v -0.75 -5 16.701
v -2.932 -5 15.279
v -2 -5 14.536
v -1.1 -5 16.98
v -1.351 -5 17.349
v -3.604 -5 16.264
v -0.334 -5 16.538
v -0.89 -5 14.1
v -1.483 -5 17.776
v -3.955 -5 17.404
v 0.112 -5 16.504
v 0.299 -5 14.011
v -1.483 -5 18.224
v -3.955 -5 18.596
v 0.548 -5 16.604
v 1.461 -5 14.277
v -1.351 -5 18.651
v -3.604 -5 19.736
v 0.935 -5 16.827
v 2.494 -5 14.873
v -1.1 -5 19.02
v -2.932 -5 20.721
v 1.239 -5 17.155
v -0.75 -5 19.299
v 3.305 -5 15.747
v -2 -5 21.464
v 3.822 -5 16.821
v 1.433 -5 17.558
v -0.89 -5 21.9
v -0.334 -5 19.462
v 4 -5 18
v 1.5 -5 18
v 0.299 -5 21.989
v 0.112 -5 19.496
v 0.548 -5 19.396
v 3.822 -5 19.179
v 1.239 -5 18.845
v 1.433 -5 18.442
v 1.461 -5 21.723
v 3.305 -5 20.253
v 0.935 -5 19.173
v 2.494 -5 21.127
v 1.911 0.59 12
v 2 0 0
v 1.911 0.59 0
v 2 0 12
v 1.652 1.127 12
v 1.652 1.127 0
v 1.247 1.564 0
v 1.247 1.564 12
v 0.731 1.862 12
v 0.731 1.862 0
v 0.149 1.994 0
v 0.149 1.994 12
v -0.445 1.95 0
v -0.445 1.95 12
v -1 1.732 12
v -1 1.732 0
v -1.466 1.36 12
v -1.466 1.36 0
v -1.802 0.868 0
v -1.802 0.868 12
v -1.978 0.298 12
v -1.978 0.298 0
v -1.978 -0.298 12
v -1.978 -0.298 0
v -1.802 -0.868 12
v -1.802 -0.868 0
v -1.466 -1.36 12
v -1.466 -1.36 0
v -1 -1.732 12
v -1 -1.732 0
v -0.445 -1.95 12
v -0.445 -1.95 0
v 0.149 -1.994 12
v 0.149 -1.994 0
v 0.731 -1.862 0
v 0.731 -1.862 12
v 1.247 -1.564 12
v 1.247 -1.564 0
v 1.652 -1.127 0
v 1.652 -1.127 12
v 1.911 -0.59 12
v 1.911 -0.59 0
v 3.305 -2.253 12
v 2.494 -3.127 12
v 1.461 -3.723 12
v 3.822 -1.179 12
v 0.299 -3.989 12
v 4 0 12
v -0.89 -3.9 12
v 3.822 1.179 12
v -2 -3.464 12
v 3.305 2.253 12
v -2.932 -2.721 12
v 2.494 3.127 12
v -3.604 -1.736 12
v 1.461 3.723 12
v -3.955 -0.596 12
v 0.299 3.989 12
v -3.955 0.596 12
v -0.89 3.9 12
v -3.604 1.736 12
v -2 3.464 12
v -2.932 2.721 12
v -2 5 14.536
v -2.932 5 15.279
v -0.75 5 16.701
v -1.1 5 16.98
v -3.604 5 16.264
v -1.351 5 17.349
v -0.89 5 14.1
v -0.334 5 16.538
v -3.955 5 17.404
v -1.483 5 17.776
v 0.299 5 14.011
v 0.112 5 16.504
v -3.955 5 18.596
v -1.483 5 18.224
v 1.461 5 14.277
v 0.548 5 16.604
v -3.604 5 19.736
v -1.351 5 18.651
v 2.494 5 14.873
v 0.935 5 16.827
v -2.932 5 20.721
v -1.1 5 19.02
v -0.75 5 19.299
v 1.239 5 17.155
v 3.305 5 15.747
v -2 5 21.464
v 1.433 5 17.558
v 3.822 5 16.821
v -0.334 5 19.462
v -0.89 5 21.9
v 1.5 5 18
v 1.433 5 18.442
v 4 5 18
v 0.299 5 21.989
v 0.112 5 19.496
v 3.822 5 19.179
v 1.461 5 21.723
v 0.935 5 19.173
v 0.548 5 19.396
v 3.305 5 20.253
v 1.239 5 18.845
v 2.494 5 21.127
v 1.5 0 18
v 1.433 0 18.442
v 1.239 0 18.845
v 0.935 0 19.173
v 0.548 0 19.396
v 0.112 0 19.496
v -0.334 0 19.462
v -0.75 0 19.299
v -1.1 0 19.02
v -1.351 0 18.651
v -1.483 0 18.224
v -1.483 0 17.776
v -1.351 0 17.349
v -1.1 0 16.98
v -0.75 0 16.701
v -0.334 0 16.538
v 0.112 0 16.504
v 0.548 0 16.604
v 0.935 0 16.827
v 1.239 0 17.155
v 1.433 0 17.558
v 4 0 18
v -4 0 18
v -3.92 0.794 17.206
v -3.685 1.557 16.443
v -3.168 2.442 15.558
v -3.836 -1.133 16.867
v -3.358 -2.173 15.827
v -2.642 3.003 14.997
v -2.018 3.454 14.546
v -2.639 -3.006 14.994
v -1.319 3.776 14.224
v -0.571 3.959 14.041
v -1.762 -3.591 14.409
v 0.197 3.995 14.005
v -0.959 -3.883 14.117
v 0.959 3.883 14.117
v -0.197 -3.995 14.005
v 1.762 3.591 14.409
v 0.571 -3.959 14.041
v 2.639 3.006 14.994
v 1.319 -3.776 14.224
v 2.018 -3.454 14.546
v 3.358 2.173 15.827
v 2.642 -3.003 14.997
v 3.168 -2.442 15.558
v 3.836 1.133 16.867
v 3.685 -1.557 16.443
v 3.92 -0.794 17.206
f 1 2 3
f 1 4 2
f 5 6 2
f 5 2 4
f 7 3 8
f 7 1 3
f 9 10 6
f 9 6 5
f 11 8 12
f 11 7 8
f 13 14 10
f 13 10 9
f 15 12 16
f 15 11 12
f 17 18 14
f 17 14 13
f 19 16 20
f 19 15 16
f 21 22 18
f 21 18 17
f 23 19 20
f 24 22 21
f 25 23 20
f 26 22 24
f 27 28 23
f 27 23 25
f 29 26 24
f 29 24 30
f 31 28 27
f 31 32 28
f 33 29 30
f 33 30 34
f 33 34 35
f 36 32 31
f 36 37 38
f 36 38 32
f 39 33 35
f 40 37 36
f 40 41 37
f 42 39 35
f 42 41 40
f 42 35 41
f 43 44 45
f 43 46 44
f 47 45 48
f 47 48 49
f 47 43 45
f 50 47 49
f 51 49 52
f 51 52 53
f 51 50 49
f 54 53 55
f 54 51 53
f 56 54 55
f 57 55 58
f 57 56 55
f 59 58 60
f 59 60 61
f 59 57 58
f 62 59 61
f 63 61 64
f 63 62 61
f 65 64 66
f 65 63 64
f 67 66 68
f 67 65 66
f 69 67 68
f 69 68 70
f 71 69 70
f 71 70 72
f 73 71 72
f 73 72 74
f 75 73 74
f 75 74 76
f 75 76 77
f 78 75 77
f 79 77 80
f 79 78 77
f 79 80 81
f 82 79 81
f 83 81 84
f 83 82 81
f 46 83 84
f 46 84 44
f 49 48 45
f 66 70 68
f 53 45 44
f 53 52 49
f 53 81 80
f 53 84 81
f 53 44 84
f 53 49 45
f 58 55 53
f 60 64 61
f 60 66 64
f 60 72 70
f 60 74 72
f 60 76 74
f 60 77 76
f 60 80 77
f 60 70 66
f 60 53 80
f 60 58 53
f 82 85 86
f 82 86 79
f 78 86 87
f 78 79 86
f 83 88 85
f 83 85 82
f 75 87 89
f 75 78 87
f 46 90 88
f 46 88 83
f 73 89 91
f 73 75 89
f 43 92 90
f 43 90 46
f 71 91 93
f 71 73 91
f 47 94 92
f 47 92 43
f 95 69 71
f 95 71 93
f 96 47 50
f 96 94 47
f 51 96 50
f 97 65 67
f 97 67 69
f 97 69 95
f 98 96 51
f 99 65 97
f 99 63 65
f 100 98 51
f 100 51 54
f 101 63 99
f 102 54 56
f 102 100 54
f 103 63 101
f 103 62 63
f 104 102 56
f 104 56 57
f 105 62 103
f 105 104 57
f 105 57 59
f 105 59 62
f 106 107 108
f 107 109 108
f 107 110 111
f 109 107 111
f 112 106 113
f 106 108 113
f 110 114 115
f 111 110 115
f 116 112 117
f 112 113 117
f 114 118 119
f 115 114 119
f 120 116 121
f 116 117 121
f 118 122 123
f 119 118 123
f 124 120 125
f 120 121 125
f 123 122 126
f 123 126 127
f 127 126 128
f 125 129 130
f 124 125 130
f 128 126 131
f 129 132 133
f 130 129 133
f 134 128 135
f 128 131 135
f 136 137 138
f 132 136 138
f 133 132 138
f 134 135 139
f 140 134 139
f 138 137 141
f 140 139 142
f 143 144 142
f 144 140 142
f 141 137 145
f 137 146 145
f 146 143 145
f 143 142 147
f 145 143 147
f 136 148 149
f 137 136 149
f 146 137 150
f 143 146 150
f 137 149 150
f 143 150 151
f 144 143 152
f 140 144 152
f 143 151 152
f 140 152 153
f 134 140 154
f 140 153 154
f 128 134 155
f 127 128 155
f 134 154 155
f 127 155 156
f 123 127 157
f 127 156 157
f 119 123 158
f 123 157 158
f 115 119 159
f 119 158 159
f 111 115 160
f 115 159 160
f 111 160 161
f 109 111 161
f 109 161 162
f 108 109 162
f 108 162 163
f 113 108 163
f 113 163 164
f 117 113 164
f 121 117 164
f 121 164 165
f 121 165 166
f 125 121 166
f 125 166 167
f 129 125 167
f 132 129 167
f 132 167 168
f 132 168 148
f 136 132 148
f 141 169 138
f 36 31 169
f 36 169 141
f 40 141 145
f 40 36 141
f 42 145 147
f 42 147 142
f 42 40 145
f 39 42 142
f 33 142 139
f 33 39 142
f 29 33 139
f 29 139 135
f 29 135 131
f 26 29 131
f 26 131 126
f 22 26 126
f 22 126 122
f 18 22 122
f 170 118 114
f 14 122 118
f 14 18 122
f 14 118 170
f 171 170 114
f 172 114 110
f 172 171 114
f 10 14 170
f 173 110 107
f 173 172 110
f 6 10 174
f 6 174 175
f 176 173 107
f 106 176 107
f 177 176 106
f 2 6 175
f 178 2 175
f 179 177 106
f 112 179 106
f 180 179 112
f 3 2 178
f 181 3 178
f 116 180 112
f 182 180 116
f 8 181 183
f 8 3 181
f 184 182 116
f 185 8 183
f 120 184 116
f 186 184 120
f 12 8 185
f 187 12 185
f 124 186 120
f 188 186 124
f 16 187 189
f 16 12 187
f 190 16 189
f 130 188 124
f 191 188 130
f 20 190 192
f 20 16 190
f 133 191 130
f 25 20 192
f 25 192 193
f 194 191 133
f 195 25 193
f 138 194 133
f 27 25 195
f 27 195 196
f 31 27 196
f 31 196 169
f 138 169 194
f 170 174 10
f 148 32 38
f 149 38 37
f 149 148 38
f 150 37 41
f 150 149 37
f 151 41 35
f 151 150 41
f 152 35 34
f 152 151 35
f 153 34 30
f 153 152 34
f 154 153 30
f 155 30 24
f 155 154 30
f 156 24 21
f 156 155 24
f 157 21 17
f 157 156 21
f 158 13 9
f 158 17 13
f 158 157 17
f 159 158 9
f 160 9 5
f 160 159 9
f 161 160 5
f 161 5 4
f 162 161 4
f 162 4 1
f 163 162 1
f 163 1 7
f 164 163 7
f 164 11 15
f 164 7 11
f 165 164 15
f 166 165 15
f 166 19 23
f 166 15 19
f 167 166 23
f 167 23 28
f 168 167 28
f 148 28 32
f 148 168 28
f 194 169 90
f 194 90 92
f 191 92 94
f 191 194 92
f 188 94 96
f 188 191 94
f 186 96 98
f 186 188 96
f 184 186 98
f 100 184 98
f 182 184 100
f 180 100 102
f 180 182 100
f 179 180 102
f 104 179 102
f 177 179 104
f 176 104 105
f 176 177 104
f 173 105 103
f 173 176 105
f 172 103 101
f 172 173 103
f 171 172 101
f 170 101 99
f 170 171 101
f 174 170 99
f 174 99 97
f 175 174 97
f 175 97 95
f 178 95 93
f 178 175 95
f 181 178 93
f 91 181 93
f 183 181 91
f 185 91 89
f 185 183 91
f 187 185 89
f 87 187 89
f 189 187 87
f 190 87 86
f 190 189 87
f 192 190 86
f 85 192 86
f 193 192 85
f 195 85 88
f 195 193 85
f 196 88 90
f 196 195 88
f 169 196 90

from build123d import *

# Parameters (mm, degrees)
SKETCH001_R       = 4
PAD_DEPTH         = 5
SKETCH002_R       = 1.5
POCKET_DEPTH      = 5.001
POCKET_DEPTH_BACK = -5.001


with BuildPart() as part:
    # Sketch (on DatumPlane) → Revolution (revolve)
    with BuildSketch(Plane.XZ):
        Polygon((0, 0), (2, 0), (2, 12), (4, 12), (4, 18), (0, 18), align=None)
    revolve(axis=Axis((0, 0, 0), (0, 0, 1)))

    # Sketch001 (on DatumPlane) → Pad (new body, symmetric)
    with BuildSketch(Plane.XZ):
        with Locations((0, 18)):
            Circle(SKETCH001_R)
    extrude(amount=PAD_DEPTH, both=True)

    # Sketch002 (on DatumPlane) → Pocket (cut, two sides)
    with BuildSketch(Plane.XZ) as pocket_sk:
        with Locations((0, 18)):
            Circle(SKETCH002_R)
    extrude(amount=-POCKET_DEPTH, mode=Mode.SUBTRACT)
    extrude(pocket_sk.sketch, amount=-POCKET_DEPTH_BACK, mode=Mode.SUBTRACT)


solid = part.part
